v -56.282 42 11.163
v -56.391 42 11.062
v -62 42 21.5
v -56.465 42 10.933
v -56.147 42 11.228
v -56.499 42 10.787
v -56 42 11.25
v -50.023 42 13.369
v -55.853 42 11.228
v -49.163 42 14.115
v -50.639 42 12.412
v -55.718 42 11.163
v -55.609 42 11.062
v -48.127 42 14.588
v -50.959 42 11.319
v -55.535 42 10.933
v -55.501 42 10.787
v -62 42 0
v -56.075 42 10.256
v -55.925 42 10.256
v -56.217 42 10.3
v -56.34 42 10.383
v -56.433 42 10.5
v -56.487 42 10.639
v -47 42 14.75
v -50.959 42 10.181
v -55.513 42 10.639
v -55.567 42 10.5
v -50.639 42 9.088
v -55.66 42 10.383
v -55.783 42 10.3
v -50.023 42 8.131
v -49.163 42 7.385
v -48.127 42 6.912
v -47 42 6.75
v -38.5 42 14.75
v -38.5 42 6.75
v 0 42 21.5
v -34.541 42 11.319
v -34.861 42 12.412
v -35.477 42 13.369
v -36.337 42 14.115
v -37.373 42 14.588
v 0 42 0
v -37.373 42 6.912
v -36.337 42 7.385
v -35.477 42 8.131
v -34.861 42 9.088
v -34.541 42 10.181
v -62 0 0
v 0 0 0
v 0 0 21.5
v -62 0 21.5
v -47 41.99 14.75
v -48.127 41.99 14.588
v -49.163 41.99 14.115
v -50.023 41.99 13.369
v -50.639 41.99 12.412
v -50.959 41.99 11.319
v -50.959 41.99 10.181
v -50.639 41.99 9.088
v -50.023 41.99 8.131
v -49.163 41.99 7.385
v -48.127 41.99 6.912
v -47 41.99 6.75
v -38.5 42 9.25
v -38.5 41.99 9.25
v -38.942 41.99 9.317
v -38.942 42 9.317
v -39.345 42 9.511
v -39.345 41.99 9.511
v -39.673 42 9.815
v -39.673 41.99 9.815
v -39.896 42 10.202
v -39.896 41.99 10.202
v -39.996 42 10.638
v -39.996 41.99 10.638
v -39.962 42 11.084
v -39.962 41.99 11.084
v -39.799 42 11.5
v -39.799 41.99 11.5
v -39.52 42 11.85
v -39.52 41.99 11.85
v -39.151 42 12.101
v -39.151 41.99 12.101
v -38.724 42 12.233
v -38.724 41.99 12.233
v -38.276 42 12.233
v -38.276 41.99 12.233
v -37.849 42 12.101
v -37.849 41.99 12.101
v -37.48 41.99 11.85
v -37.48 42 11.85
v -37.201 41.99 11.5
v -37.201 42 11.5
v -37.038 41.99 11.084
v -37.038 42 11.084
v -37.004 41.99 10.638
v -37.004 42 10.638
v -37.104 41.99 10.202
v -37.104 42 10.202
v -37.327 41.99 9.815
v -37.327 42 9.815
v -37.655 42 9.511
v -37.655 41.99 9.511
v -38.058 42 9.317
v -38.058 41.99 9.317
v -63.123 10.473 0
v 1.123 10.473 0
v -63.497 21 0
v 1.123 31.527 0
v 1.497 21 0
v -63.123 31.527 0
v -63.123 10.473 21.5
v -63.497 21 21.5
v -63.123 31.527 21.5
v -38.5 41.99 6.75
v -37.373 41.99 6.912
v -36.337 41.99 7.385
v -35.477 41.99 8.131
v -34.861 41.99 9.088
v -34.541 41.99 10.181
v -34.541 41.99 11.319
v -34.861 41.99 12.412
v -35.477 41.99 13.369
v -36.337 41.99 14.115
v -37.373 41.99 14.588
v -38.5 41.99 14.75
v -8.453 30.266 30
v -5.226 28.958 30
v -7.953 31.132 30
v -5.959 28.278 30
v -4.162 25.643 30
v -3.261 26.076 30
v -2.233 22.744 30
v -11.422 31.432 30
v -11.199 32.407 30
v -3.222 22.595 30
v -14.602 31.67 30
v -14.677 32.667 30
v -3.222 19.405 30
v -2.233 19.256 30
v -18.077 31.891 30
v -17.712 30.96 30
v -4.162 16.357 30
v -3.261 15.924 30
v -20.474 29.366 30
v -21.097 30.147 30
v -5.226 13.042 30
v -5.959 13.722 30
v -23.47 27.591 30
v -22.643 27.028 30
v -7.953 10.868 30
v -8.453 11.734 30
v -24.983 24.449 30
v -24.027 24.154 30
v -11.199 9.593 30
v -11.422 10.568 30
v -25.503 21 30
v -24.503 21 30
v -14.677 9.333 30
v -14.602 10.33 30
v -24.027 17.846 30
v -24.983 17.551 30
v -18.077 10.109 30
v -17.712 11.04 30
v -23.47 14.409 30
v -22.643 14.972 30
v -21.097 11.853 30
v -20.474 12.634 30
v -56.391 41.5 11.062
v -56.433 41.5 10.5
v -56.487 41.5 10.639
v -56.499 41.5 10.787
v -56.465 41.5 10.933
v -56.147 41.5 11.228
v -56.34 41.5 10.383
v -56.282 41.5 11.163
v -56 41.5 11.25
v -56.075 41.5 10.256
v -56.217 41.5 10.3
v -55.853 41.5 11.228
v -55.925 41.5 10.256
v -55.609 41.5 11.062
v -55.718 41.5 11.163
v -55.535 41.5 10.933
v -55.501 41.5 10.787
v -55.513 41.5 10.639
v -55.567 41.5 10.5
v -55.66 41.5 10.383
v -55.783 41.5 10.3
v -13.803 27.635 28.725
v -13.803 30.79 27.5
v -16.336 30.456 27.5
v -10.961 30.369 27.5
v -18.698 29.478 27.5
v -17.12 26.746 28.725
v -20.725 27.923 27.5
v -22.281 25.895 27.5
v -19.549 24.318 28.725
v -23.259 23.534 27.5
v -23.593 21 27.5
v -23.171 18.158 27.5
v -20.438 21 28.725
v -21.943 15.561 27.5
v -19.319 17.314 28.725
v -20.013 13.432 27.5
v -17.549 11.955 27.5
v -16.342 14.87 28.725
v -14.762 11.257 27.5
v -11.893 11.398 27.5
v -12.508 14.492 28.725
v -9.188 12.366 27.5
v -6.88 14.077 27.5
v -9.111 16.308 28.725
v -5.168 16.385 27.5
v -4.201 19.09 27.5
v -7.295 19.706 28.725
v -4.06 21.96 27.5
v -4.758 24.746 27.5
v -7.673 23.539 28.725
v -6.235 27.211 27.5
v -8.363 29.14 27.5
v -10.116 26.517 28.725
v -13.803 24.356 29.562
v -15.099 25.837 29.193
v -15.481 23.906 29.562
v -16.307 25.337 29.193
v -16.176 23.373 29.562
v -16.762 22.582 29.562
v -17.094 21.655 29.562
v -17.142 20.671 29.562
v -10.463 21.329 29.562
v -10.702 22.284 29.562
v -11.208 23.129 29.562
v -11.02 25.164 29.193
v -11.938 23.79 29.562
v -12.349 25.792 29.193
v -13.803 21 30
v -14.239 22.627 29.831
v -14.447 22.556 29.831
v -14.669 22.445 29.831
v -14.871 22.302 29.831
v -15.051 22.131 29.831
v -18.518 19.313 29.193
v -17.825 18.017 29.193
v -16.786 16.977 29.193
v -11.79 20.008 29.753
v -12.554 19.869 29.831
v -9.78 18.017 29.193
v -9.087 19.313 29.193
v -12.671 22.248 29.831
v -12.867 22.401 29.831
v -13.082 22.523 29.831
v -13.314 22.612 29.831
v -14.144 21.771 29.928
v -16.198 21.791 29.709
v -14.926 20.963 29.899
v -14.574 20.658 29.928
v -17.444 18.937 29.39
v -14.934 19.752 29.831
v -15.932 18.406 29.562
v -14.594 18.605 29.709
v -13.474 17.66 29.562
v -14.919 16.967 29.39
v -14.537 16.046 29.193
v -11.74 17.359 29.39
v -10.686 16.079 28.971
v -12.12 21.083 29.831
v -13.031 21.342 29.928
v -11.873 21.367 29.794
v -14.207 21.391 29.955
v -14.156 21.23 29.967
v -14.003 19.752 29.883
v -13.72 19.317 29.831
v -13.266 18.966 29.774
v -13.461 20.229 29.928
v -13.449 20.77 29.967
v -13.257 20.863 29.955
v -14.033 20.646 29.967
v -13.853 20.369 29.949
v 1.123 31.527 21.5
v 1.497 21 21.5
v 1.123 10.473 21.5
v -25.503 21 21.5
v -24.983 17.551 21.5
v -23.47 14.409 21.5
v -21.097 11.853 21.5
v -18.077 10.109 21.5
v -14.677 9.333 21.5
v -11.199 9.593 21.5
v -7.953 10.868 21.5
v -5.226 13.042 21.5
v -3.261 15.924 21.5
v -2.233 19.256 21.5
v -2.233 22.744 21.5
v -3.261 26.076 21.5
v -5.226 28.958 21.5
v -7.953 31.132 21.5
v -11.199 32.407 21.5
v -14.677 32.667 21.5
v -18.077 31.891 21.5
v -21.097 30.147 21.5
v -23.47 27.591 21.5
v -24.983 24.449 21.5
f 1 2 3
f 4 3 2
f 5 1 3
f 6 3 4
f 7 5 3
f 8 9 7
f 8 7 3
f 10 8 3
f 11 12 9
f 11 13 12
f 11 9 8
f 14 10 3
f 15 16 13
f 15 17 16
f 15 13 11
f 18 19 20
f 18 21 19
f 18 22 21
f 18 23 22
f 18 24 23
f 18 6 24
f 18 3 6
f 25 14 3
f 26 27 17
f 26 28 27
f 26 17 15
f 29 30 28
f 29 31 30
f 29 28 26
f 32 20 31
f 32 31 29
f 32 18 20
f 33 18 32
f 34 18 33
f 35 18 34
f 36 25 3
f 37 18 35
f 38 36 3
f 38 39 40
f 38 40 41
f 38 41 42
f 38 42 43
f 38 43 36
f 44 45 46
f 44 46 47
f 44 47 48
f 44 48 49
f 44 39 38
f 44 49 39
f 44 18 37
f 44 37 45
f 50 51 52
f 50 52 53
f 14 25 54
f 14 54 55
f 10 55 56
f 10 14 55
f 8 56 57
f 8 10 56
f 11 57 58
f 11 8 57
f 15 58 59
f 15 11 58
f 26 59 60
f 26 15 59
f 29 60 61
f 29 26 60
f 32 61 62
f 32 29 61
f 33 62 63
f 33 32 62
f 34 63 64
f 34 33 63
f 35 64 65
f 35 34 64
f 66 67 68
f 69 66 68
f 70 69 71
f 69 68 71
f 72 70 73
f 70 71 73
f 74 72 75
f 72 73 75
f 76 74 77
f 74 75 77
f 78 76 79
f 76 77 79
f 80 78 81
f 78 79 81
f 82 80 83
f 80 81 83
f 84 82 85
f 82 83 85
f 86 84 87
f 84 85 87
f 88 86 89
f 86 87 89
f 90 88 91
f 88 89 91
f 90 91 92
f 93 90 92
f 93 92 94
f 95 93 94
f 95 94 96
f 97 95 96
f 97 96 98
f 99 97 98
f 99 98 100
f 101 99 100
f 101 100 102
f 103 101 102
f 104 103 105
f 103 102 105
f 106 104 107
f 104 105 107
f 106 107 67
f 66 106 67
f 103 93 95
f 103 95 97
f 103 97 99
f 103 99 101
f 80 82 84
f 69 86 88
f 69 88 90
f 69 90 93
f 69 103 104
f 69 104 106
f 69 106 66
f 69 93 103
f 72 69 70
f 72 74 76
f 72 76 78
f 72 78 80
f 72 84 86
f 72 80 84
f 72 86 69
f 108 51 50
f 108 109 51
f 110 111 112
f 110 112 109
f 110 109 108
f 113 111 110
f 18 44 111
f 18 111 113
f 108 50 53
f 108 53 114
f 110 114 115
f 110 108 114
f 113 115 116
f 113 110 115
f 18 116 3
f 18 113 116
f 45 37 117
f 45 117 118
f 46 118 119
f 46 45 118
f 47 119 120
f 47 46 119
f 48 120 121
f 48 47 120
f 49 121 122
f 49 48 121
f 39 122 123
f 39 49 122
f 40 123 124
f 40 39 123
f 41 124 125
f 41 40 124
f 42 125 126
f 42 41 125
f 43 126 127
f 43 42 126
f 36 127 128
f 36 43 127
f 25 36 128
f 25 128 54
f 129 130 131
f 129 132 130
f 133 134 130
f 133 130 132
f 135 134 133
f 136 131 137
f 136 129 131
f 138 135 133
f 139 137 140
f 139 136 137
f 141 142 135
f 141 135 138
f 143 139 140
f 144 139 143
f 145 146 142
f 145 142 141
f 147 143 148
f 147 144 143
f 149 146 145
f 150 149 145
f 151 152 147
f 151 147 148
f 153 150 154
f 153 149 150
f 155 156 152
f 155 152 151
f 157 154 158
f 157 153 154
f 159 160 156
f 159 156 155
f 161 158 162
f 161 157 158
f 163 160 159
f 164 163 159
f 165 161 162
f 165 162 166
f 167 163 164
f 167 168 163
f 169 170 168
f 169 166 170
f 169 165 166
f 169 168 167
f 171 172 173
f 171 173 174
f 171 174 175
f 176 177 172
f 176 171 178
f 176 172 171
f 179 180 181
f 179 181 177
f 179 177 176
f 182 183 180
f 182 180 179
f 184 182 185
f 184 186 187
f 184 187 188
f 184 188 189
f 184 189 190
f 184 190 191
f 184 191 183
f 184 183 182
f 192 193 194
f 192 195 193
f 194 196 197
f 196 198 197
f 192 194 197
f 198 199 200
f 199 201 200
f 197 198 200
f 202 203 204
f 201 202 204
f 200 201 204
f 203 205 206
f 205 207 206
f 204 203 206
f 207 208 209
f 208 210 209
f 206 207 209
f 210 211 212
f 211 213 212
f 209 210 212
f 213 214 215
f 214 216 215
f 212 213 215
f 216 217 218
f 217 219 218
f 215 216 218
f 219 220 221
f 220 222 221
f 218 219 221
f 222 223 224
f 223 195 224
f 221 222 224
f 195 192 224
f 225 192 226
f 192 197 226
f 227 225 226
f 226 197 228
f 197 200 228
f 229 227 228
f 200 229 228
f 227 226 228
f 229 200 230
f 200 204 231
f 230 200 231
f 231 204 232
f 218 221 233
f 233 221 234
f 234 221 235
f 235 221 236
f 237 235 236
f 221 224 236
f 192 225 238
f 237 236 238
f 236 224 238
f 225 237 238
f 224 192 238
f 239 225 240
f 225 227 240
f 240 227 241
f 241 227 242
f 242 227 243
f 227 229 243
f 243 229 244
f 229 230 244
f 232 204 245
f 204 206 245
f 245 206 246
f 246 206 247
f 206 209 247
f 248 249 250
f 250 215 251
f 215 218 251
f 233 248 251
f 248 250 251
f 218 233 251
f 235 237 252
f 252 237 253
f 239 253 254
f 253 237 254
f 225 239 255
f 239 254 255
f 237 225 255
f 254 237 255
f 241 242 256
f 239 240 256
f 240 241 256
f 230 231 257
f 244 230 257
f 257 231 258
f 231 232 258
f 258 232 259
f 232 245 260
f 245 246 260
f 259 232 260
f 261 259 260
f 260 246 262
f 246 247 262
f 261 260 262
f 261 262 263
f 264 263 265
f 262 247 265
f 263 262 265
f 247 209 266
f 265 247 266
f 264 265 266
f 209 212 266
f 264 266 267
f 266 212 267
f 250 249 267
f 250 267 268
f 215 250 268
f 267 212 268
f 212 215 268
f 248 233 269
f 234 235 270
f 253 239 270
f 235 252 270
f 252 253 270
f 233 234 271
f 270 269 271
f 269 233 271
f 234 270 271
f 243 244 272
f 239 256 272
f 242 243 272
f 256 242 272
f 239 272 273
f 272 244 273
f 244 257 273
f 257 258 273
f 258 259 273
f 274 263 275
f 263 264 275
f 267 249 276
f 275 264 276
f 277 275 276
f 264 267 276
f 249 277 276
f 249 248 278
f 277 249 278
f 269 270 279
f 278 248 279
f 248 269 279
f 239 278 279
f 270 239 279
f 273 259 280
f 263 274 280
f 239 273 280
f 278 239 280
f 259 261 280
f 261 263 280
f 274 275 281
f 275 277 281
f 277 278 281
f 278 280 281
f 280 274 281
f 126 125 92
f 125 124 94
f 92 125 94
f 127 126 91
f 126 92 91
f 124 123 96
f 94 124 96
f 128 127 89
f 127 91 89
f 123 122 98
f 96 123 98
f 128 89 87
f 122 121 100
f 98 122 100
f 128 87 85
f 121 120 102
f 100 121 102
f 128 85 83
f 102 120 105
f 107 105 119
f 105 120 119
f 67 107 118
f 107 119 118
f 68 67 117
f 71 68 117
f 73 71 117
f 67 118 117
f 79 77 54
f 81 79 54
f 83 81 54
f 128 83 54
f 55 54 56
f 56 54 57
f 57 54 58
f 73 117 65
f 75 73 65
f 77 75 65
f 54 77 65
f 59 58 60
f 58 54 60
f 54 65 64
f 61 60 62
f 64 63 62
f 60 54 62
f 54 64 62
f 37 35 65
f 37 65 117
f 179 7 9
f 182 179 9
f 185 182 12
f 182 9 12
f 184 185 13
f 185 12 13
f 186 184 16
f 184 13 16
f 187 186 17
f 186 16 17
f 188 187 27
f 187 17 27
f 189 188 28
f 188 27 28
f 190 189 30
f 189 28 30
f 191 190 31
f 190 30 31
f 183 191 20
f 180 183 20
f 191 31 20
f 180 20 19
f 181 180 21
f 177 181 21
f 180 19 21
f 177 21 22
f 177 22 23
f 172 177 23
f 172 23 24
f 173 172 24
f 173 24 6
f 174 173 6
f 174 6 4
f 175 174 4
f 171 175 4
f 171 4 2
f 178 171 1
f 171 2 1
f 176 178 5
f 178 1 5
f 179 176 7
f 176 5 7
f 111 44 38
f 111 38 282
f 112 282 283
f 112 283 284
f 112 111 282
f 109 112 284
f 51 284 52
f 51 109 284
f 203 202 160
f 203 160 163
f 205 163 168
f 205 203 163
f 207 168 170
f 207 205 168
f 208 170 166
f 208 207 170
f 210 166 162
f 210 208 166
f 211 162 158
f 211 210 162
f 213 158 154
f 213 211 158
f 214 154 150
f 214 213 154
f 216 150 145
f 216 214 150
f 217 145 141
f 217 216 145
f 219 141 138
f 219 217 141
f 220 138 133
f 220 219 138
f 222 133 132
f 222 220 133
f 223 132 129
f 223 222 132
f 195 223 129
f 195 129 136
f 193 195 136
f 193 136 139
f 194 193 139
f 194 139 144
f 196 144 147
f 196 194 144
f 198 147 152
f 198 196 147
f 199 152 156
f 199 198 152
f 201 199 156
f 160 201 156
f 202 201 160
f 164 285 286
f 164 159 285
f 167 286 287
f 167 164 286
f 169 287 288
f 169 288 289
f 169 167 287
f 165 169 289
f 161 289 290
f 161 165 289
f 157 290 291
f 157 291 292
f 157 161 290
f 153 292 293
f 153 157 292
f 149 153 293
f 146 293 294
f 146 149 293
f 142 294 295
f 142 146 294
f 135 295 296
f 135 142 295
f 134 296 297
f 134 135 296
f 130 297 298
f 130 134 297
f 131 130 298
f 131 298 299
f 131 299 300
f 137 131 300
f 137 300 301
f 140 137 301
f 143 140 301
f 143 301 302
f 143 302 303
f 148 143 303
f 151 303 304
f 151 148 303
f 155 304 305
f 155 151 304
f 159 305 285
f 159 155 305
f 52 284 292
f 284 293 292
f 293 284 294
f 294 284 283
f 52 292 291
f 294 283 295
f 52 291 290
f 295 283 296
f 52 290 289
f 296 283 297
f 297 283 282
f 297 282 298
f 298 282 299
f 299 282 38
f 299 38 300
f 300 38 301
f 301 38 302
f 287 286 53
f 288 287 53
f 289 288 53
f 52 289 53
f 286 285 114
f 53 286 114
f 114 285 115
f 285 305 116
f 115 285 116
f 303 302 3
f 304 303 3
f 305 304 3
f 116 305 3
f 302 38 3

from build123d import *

# Parameters (mm, degrees)
SALIENTE_EXTRUIR1_DEPTH = 21.5
CORTAR_EXTRUIR1_DEPTH   = 0.01
CROQUIS3_R              = 1.5
SALIENTE_EXTRUIR2_DEPTH = 0.01
CROQUIS4_R              = 0.5
CORTAR_EXTRUIR2_DEPTH   = 0.5


with BuildPart() as part:
    # Croquis1 → Saliente-Extruir1 (new body)
    with BuildSketch(Plane.XY):
        with BuildLine():
            Line((0, 0), (-62, 0))
            ThreePointArc((-62, 0), (-63.497440295, 21), (-62, 42))
            Line((-62, 42), (0, 42))
            ThreePointArc((0, 42), (1.497440295, 21), (0, 0))
        make_face()
    extrude(amount=SALIENTE_EXTRUIR1_DEPTH)

    # Croquis2 → Cortar-Extruir1 (cut)
    with BuildSketch(Plane(origin=(0, 42, 0), x_dir=(1, 0, 0), z_dir=(0, 1, 0))):
        with BuildLine():
            Line((-47, -6.75), (-38.5, -6.75))
            ThreePointArc((-38.5, -6.75), (-34.5, -10.75), (-38.5, -14.75))
            Line((-38.5, -14.75), (-47, -14.75))
            ThreePointArc((-47, -14.75), (-51, -10.75), (-47, -6.75))
        make_face()
    extrude(amount=-CORTAR_EXTRUIR1_DEPTH, mode=Mode.SUBTRACT)

    # Croquis3 → Saliente-Extruir2 (add)
    with BuildSketch(Plane(origin=(0, 41.99, 0), x_dir=(1, 0, 0), z_dir=(0, 1, 0))):
        with Locations(Location((-38.5, -10.75, 0), (0, 0, 90))):
            Circle(CROQUIS3_R)
    extrude(amount=SALIENTE_EXTRUIR2_DEPTH)

    # Croquis4 → Cortar-Extruir2 (cut)
    with BuildSketch(Plane(origin=(0, 42, 0), x_dir=(1, 0, 0), z_dir=(0, 1, 0))):
        with Locations(Location((-56, -10.75, 0), (0, 0, 270))):
            Circle(CROQUIS4_R)
    extrude(amount=-CORTAR_EXTRUIR2_DEPTH, mode=Mode.SUBTRACT)

    # Croquis6 → Revolución1 (revolve)
    with BuildSketch(Plane(origin=(0, 21, 0), x_dir=(-1, 0, 0), z_dir=(0, -1, 0))):
        Polygon((25.502559705, -21.5), (25.502559705, -30), (24.502559705, -30), (23.592634119, -27.5), (22.592634119, -27.5), (13.802559705, -27.5), (13.802559705, -21.5), align=None)
    revolve(axis=Axis((-13.802559705, 21, 21.5), (0, 0, 1)))

    # Croquis9 → Revolución3 (revolve)
    with BuildSketch(Plane(origin=(0, 21, 0), x_dir=(1, 0, 0), z_dir=(0, 1, 0)), mode=Mode.PRIVATE) as revoluci_n3_sk:
        with BuildLine():
            Line((-13.802559705, -27.5), (-13.802559705, -30))
            ThreePointArc((-13.802559705, -30), (-18.810632516, -29.192650791), (-23.592634119, -27.5))
            Line((-23.592634119, -27.5), (-13.802559705, -27.5))
        make_face()
    revolve(revoluci_n3_sk.sketch.rotate(Axis((-13.802559705, 21, 27.5), (0, 0, 1)), 270), axis=Axis((-13.802559705, 21, 27.5), (0, 0, 1)))


solid = part.part
